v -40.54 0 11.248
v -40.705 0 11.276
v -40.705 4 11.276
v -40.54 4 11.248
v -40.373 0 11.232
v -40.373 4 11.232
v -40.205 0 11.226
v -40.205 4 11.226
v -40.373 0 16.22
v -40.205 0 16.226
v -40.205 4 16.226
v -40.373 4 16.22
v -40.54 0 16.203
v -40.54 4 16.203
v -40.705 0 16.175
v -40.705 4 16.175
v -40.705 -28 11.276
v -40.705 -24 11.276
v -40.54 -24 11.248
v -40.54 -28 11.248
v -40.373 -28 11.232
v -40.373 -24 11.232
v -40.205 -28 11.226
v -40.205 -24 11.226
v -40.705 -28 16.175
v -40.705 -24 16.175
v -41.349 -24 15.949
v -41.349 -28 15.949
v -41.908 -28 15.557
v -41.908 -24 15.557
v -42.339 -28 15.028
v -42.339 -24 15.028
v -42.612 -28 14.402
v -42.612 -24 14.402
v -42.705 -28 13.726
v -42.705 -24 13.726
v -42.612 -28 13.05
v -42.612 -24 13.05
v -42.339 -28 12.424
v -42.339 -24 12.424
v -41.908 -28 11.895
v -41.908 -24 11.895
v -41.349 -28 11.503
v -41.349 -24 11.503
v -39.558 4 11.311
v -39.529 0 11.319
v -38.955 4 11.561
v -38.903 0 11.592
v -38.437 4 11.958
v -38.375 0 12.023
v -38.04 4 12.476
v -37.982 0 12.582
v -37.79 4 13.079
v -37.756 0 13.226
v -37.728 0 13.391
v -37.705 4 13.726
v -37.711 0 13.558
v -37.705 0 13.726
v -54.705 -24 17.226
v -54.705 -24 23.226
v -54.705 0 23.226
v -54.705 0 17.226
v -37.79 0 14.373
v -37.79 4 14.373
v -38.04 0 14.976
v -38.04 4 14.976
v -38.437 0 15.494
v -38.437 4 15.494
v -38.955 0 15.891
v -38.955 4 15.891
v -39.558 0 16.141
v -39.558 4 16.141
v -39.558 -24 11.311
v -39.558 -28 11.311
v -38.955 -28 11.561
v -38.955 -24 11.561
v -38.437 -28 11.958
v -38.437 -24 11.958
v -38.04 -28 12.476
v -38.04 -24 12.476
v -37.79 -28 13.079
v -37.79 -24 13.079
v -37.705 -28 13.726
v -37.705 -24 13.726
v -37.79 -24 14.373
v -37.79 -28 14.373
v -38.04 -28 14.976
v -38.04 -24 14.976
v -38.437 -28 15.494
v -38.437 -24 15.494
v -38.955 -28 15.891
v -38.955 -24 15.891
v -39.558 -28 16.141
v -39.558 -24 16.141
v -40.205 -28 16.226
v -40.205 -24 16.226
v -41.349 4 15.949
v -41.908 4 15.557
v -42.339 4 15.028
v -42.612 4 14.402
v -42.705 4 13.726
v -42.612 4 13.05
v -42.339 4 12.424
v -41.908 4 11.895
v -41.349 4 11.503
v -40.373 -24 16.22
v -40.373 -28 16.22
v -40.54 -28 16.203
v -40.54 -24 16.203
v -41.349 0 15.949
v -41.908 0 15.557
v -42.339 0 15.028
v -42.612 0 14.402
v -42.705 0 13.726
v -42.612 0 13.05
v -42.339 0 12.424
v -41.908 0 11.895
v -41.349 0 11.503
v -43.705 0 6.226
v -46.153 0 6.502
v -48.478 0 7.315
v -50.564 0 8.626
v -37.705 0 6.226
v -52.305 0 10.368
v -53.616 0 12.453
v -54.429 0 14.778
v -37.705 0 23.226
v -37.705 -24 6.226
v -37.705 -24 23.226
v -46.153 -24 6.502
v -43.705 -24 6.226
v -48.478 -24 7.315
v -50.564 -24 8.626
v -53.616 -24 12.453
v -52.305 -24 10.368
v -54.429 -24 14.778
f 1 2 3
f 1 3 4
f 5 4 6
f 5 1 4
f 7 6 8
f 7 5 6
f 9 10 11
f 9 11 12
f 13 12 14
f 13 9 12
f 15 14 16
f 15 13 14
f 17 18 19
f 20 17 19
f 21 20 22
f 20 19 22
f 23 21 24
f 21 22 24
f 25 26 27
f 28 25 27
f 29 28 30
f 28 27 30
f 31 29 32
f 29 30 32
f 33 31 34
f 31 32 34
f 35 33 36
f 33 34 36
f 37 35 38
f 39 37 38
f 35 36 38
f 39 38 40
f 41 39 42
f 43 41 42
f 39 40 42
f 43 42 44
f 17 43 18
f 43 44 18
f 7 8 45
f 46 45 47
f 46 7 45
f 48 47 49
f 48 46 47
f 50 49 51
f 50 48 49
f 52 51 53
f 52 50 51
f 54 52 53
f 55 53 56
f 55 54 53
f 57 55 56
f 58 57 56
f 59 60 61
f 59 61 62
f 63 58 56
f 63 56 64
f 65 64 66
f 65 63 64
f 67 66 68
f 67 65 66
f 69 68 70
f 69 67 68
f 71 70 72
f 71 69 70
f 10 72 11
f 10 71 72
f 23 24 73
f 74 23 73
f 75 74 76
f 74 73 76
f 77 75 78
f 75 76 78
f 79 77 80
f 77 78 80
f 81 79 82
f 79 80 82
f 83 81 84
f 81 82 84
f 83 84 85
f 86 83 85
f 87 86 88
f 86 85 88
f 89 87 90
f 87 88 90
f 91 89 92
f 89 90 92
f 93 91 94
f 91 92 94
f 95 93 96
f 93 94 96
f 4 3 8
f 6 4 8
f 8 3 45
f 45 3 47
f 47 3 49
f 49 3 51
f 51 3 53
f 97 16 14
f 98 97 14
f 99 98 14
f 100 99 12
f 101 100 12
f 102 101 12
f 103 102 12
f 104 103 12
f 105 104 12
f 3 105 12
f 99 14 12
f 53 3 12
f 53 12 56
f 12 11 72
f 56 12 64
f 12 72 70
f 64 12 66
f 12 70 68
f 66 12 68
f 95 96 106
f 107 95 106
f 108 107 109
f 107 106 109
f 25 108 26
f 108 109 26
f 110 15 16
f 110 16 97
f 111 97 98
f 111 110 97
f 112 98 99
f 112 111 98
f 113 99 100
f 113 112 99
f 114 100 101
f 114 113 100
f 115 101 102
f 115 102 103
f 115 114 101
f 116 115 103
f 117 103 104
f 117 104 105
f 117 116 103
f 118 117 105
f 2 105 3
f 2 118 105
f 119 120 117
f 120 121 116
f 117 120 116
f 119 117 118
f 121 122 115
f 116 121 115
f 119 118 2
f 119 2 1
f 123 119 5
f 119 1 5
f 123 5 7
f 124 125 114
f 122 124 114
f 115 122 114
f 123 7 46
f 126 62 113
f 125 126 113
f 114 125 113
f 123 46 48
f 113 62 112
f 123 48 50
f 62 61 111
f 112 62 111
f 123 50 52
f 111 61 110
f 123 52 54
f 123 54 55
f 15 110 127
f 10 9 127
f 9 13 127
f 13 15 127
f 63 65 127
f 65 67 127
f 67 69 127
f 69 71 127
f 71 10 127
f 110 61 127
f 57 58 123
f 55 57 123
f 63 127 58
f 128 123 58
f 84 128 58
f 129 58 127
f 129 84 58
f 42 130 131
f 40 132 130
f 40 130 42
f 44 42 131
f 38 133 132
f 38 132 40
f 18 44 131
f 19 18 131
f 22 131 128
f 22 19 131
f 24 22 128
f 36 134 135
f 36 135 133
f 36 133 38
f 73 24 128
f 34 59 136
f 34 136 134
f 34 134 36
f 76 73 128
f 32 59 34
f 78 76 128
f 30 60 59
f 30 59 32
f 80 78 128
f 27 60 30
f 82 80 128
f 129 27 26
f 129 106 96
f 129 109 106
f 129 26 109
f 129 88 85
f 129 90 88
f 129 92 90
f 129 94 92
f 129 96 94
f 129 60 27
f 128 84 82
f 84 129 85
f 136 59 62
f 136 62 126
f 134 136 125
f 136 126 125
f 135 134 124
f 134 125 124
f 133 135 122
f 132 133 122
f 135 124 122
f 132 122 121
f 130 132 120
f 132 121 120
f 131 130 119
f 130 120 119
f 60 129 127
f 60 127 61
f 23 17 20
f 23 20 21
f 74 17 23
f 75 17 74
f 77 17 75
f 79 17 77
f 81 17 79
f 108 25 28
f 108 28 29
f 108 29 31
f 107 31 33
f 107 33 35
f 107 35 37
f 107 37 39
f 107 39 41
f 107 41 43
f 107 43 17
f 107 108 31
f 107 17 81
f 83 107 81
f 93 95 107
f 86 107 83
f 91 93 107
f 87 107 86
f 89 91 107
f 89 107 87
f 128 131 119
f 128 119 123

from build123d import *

# Parameters (mm, degrees)
F0_W     = 14
F0_H     = 12
F1_DEPTH = 24
F3_DEPTH = 28
F4_DEPTH = 4
F6_DEPTH = 24
F8_DEPTH = 24
F9_R     = 11


with BuildPart() as f1:
    # F0 (on Front) → F1 (new body)
    with BuildSketch(Plane.XZ):
        with Locations((-47.7052051574, 17.2259079414)):
            Rectangle(F0_W, F0_H)
    extrude(amount=F1_DEPTH)

    # F2 (on face) → F3 (join)
    with BuildSketch(Plane.XZ.offset(24)):
        with BuildLine():
            ThreePointArc((-40.7052051574, 11.2764181987), (-40.4564775624, 11.2385675589), (-40.2052051574, 11.2259079414))
            ThreePointArc((-40.2052051574, 11.2259079414), (-38.4374382044, 11.9581409885), (-37.7052051574, 13.7259079414))
            ThreePointArc((-37.7052051574, 13.7259079414), (-38.4374382044, 15.4936748944), (-40.2052051574, 16.2259079414))
            ThreePointArc((-40.2052051574, 16.2259079414), (-40.4564775624, 16.2132483239), (-40.7052051574, 16.1753976842))
            Line((-40.7052051574, 16.1753976842), (-40.7052051574, 11.2764181987))
        make_face()
        with BuildLine():
            ThreePointArc((-40.7052051574, 16.1753976842), (-42.7052051574, 13.7259079414), (-40.7052051574, 11.2764181987))
            Line((-40.7052051574, 11.2764181987), (-40.7052051574, 16.1753976842))
        make_face()
    extrude(amount=-F3_DEPTH)

    # F2 (on face) → F4 (join)
    with BuildSketch(Plane.XZ.offset(24)):
        with BuildLine():
            ThreePointArc((-40.7052051574, 11.2764181987), (-40.4564775624, 11.2385675589), (-40.2052051574, 11.2259079414))
            ThreePointArc((-40.2052051574, 11.2259079414), (-38.4374382044, 11.9581409885), (-37.7052051574, 13.7259079414))
            ThreePointArc((-37.7052051574, 13.7259079414), (-38.4374382044, 15.4936748944), (-40.2052051574, 16.2259079414))
            ThreePointArc((-40.2052051574, 16.2259079414), (-40.4564775624, 16.2132483239), (-40.7052051574, 16.1753976842))
            Line((-40.7052051574, 16.1753976842), (-40.7052051574, 11.2764181987))
        make_face()
        with BuildLine():
            ThreePointArc((-40.7052051574, 16.1753976842), (-42.7052051574, 13.7259079414), (-40.7052051574, 11.2764181987))
            Line((-40.7052051574, 11.2764181987), (-40.7052051574, 16.1753976842))
        make_face()
    extrude(amount=F4_DEPTH)

    # F5 (on face) → F6 (join)
    with BuildSketch(Plane.XZ.offset(24)):
        Polygon((-37.7052051574, 23.2259079414), (-40.7052051574, 23.2259079414), (-40.7052051574, 16.1753976842), (-40.7052051574, 13.2259079414), (-37.7052051574, 13.2259079414), align=None)
    extrude(amount=-F6_DEPTH)

    # F7 (on face) → F8 (join)
    with BuildSketch(Plane.XZ.offset(24)):
        with BuildLine():
            Line((-40.7052051574, 11.2259079414), (-54.7052051574, 11.2259079414))
            Line((-54.7052051574, 11.2259079414), (-54.7052051574, 6.2259079414))
            Line((-54.7052051574, 6.2259079414), (-37.7052051574, 6.2259079414))
            Line((-37.7052051574, 6.2259079414), (-37.7052051574, 13.2259079414))
            Line((-37.7052051574, 13.2259079414), (-37.7557154146, 13.2259079414))
            ThreePointArc((-37.7557154146, 13.2259079414), (-37.7178647749, 13.4746355364), (-37.7052051574, 13.7259079414))
            ThreePointArc((-37.7052051574, 13.7259079414), (-41.7863439875, 15.6623996145), (-40.7052051574, 11.2764181987))
            Line((-40.7052051574, 11.2764181987), (-40.7052051574, 11.2259079414))
        make_face()
    extrude(amount=-F8_DEPTH)

    # F9
    f9_edges = [f1.edges().sort_by_distance(p)[0] for p in [
        (-54.705205, -12, 6.225908),
    ]]
    fillet(f9_edges, radius=F9_R)


solid = f1.part
